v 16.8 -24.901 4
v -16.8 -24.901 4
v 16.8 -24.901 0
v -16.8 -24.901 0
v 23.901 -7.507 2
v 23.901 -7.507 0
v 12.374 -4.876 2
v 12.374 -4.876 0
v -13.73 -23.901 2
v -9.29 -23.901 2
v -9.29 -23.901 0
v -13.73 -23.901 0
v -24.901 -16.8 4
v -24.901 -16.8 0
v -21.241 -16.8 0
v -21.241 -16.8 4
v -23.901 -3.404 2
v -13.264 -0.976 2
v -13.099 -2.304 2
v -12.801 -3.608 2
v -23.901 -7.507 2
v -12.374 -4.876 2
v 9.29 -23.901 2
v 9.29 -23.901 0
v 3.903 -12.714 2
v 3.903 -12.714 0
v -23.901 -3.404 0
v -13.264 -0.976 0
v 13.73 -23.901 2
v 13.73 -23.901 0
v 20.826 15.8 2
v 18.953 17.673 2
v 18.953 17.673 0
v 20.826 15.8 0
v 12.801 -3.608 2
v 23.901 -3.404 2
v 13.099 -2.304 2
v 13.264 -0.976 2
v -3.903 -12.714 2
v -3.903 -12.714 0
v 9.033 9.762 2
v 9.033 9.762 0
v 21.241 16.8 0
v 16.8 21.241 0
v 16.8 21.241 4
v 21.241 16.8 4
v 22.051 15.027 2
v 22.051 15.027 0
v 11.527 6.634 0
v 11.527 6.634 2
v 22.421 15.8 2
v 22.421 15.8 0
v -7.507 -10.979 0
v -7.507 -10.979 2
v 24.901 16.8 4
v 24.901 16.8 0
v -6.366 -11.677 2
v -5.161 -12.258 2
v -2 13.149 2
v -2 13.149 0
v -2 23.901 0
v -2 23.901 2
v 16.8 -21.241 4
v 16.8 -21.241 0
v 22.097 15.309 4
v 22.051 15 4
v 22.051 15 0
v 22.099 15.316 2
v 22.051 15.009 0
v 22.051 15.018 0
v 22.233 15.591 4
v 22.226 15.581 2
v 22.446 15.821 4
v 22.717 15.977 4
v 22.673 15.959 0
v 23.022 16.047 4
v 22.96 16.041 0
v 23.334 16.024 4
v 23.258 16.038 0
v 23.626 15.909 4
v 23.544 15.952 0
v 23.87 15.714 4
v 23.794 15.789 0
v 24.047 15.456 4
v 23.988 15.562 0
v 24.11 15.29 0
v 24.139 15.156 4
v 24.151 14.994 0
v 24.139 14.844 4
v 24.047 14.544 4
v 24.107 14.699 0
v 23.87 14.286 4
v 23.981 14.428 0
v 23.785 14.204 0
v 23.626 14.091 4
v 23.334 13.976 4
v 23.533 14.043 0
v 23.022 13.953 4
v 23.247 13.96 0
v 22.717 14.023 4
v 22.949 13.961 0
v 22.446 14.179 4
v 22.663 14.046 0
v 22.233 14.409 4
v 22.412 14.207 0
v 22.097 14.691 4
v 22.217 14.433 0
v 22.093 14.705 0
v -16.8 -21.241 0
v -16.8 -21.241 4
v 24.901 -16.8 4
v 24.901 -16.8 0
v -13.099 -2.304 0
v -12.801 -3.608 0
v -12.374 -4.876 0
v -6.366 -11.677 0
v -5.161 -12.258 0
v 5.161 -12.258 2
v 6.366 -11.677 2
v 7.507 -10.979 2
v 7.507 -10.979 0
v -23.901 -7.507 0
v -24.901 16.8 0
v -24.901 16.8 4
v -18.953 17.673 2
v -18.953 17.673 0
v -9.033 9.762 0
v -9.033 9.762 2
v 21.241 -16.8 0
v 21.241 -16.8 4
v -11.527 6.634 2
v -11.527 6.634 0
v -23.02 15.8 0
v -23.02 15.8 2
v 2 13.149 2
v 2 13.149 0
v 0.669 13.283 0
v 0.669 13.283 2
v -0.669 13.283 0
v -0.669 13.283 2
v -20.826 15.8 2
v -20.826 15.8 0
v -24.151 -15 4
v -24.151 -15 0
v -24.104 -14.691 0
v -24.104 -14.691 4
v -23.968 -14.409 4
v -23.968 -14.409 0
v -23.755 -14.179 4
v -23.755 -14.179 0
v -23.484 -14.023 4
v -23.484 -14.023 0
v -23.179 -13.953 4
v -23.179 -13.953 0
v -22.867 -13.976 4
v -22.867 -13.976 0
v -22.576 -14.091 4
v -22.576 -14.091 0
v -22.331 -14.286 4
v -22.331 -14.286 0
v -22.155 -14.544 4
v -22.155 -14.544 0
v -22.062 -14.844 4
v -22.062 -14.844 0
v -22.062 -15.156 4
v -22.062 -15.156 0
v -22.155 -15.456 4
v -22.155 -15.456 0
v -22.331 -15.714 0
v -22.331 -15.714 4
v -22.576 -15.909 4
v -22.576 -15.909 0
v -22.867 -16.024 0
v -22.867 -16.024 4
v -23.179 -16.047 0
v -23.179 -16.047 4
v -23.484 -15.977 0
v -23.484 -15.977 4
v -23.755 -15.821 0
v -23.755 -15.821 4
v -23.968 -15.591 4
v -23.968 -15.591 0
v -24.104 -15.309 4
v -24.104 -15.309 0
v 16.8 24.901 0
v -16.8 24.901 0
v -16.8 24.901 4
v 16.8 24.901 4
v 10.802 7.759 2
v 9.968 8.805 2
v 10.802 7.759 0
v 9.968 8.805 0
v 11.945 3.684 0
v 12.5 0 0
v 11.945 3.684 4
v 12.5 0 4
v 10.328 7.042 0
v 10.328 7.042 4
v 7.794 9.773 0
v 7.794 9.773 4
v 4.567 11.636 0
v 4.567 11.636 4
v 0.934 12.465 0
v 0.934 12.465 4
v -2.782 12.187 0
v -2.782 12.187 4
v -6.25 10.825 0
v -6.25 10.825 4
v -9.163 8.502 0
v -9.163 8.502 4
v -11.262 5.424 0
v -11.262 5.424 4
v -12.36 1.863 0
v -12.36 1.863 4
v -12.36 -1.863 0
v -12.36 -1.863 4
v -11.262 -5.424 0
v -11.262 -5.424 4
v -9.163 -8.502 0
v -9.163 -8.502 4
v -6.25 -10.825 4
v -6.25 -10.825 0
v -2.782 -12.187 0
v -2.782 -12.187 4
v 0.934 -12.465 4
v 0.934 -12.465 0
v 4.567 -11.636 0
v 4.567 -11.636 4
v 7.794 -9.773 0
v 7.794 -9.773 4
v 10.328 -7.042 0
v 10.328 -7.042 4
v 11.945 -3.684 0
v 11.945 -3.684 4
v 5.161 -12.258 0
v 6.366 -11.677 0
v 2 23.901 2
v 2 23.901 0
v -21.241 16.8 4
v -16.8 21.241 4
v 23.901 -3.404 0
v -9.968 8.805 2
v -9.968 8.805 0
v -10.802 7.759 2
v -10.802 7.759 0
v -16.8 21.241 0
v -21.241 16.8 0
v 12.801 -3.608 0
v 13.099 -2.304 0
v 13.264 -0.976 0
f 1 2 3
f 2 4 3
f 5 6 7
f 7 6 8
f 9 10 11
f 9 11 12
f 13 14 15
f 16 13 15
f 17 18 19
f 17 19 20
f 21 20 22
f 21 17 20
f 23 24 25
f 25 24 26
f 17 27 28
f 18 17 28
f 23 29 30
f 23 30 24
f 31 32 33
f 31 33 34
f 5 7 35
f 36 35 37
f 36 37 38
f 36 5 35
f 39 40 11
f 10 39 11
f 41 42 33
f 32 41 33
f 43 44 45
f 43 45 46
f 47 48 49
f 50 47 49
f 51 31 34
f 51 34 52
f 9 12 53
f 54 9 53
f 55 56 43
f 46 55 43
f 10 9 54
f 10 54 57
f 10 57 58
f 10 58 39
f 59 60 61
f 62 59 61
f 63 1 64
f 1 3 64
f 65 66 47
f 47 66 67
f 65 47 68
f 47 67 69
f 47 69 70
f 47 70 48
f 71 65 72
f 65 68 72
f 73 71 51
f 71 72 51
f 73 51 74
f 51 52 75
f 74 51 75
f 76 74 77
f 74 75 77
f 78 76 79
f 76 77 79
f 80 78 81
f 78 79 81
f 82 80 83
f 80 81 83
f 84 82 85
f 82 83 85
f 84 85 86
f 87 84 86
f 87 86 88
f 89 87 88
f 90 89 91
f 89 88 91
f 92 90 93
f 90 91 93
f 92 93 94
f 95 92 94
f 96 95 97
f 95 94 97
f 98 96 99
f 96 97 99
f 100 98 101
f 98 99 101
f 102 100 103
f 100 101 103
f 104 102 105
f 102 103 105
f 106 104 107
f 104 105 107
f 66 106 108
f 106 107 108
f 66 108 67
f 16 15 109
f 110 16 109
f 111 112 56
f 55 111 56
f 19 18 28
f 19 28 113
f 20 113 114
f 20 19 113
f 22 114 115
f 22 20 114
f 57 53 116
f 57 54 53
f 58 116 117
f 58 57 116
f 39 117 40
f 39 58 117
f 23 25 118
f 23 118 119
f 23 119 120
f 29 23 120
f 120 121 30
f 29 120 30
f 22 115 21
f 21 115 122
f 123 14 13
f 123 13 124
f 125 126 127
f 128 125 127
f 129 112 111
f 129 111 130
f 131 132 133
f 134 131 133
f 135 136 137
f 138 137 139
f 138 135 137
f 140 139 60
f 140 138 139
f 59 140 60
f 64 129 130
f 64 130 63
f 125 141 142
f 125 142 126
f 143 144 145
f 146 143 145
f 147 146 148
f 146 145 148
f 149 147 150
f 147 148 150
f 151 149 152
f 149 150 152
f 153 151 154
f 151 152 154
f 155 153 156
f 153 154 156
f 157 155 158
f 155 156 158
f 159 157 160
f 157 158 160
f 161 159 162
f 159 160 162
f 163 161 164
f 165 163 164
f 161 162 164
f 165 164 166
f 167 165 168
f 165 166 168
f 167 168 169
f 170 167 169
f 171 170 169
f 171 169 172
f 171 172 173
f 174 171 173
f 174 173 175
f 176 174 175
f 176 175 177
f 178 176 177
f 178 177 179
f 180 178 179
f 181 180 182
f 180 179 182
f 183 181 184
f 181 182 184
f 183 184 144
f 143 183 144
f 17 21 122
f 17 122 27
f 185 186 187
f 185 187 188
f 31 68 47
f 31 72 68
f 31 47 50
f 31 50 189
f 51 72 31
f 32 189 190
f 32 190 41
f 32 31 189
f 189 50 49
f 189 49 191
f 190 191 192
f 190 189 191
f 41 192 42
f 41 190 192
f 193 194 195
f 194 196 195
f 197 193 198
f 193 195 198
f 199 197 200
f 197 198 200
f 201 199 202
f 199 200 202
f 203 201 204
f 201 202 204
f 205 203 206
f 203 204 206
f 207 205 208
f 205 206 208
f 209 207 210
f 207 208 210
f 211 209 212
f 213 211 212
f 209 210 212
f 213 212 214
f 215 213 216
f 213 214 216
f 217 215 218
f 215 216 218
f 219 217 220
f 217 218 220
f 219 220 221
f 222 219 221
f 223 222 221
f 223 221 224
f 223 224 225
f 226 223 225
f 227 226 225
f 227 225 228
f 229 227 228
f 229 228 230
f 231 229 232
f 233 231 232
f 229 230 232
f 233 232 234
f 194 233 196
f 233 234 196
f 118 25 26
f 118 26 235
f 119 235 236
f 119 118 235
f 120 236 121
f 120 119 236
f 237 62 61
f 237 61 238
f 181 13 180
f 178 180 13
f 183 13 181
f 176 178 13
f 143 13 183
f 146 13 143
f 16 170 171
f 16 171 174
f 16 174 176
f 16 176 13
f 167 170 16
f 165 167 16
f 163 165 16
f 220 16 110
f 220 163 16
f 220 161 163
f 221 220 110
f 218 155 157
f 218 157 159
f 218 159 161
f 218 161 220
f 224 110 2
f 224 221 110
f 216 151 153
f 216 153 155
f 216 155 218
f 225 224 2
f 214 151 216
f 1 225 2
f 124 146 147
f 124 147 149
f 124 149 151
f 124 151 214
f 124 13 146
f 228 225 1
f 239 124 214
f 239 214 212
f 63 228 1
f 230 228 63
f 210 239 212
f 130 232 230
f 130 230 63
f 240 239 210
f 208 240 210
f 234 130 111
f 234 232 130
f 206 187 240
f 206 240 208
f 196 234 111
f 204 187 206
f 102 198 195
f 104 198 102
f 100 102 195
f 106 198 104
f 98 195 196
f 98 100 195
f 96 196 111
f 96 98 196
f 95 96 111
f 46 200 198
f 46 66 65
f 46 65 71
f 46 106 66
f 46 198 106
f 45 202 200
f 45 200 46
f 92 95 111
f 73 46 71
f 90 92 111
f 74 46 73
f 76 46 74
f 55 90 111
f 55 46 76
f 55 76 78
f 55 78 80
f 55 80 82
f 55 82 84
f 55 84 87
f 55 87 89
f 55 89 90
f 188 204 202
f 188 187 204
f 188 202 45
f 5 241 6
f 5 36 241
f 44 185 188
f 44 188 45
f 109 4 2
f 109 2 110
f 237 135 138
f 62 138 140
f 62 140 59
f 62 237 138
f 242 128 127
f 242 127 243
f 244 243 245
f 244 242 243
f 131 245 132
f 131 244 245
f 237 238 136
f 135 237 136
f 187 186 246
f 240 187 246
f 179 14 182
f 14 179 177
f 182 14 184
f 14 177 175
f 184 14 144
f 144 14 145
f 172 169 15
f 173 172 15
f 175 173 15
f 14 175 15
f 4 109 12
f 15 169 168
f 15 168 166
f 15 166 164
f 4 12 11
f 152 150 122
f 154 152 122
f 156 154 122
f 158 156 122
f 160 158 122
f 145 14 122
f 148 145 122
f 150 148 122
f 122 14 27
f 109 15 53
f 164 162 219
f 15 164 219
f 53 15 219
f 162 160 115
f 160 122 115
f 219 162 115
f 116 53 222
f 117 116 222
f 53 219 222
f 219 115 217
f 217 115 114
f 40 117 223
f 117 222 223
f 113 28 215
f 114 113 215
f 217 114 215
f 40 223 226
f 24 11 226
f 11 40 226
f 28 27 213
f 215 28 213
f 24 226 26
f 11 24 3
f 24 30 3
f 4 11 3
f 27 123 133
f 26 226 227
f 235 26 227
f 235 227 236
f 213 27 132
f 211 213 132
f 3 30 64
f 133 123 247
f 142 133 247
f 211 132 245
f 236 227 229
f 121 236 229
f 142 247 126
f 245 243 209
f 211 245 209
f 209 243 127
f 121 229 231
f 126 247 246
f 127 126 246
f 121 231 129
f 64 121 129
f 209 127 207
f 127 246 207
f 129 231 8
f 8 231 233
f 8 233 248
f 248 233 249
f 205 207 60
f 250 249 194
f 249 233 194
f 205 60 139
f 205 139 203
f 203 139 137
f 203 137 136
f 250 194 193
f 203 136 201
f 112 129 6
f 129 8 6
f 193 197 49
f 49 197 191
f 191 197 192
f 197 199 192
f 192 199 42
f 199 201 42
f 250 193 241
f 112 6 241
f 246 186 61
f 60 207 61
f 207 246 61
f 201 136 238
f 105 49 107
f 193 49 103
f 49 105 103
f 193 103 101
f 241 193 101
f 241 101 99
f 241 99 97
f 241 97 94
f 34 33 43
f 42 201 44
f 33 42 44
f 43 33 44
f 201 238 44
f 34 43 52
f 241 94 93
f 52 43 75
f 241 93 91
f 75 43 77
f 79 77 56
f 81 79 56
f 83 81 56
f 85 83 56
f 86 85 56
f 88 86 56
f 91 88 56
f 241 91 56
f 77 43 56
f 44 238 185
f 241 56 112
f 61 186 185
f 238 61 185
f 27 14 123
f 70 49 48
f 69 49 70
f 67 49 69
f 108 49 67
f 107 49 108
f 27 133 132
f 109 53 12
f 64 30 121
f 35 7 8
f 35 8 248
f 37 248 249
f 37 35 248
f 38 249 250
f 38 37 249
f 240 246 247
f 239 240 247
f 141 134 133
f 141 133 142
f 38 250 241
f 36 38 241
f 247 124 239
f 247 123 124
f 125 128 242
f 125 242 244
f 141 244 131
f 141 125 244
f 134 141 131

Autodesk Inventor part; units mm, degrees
ref_plane "YZ Plane" through (0, 0, 0) normal (1, 0, 0) x (0, 1, 0)
ref_plane "XZ Plane" through (0, 0, 0) normal (0, 1, 0) x (-1, 0, 0)
ref_plane "XY Plane" through (0, 0, 0) normal (0, 0, 1) x (1, 0, 0)
sketch "Sketch1" plane through (0, 0, 0) normal (0, 0, 1) x (1, 0, 0)
  line L0 (-34.8609, 0) -> (34.8609, 0) construction
  line L1 (0, -34.8609) -> (0, 34.8609) construction
  line L2 (0, 0) -> (11.6542, 11.6542) construction
  line L3 (0, 0) -> (16.4815, 0) construction
  line L4 (0, 24.9006) -> (16.8, 24.9006)
  line L5 (16.8, 24.9006) -> (16.8, 21.2406)
  line L6 (16.8, 21.2406) -> (19.0203, 19.0203)
  line L7 (24.9006, 0) -> (24.9006, 16.8)
  line L8 (24.9006, 16.8) -> (21.2406, 16.8)
  line L9 (21.2406, 16.8) -> (19.0203, 19.0203)
  line L10 (0, 0) -> (-11.6542, 11.6542) construction
  line L11 (0, 0) -> (-16.4815, 0) construction
  line L12 (0, 24.9006) -> (-16.8, 24.9006)
  line L13 (-16.8, 24.9006) -> (-16.8, 21.2406)
  line L14 (-16.8, 21.2406) -> (-19.0203, 19.0203)
  line L15 (-24.9006, 0) -> (-24.9006, 16.8)
  line L16 (-24.9006, 16.8) -> (-21.2406, 16.8)
  line L17 (-21.2406, 16.8) -> (-19.0203, 19.0203)
  line L18 (0, 0) -> (11.6542, -11.6542) construction
  line L19 (0, -24.9006) -> (16.8, -24.9006)
  line L20 (16.8, -24.9006) -> (16.8, -21.2406)
  line L21 (16.8, -21.2406) -> (19.0203, -19.0203)
  line L22 (24.9006, 0) -> (24.9006, -16.8)
  line L23 (24.9006, -16.8) -> (21.2406, -16.8)
  line L24 (21.2406, -16.8) -> (19.0203, -19.0203)
  line L25 (0, 0) -> (-11.6542, -11.6542) construction
  line L26 (0, -24.9006) -> (-16.8, -24.9006)
  line L27 (-16.8, -24.9006) -> (-16.8, -21.2406)
  line L28 (-16.8, -21.2406) -> (-19.0203, -19.0203)
  line L29 (-24.9006, 0) -> (-24.9006, -16.8)
  line L30 (-24.9006, -16.8) -> (-21.2406, -16.8)
  line L31 (-21.2406, -16.8) -> (-19.0203, -19.0203)
  dimension "d0" = 45
  dimension "d1" = 3.14
  dimension "d2" = 3.66
  dimension "d3" = 16.8
extrude "Extrusion1" add sketch "Sketch1" along normal blind 4
hole "Hole1" at (0, 0, 0) direction (0, 0, 1) diameter 26.6 end through all
sketch "Sketch6" plane through (0, 0, 4) normal (0, 0, 1) x (1, 0, 0)
  circle A0 centre (0, 0) radius 13.3 construction
  line L0 (16.8, 24.9006) -> (-16.8, 24.9006) construction
  line L1 (-16.8, 24.9006) -> (-16.8, 21.2406) construction
  line L2 (-16.8, 21.2406) -> (-21.2406, 16.8) construction
  line L3 (-21.2406, 16.8) -> (-24.9006, 16.8) construction
  line L4 (-24.9006, 16.8) -> (-24.9006, -16.8) construction
  line L5 (-24.9006, -16.8) -> (-21.2406, -16.8) construction
  line L6 (-21.2406, -16.8) -> (-16.8, -21.2406) construction
  line L7 (-16.8, -21.2406) -> (-16.8, -24.9006) construction
  line L8 (-16.8, -24.9006) -> (16.8, -24.9006) construction
  line L9 (16.8, -24.9006) -> (16.8, -21.2406) construction
  line L10 (16.8, -21.2406) -> (21.2406, -16.8) construction
  line L11 (21.2406, -16.8) -> (24.9006, -16.8) construction
  line L12 (24.9006, -16.8) -> (24.9006, 16.8) construction
  line L13 (24.9006, 16.8) -> (21.2406, 16.8) construction
  line L14 (21.2406, 16.8) -> (16.8, 21.2406) construction
  line L15 (16.8, 21.2406) -> (16.8, 24.9006) construction
  circle A1 centre (0, 0) radius 13.3
  circle A2 centre (0, 0) radius 13.5
  dimension "d42" = 26.6
  dimension "d43" = 27
extrude "Extrusion4" [suppressed]
sketch "Sketch7" plane through (0, 0, 0) normal (0, 0, -1) x (-1, 0, 0)
  line L0 (16.8, 24.9006) -> (-16.8, 24.9006) construction
  line L1 (-16.8, 24.9006) -> (-16.8, 21.2406) construction
  line L2 (-16.8, 21.2406) -> (-21.2406, 16.8) construction
  line L3 (-21.2406, 16.8) -> (-24.9006, 16.8) construction
  line L4 (-24.9006, 16.8) -> (-24.9006, -16.8) construction
  line L5 (-24.9006, -16.8) -> (-21.2406, -16.8) construction
  line L6 (-21.2406, -16.8) -> (-16.8, -21.2406) construction
  line L7 (-16.8, -21.2406) -> (-16.8, -24.9006) construction
  line L8 (-16.8, -24.9006) -> (16.8, -24.9006) construction
  line L9 (16.8, -24.9006) -> (16.8, -21.2406) construction
  line L10 (16.8, -21.2406) -> (21.2406, -16.8) construction
  line L11 (21.2406, -16.8) -> (24.9006, -16.8) construction
  line L12 (24.9006, -16.8) -> (24.9006, 16.8) construction
  line L13 (24.9006, 16.8) -> (21.2406, 16.8) construction
  line L14 (21.2406, 16.8) -> (16.8, 21.2406) construction
  line L15 (16.8, 21.2406) -> (16.8, 24.9006) construction
  line L16 (-2.0147, 24.1761) -> (-2, 24) construction
  line L17 (-1.9775, 24.0019) -> (-1.9921, 24.178) construction
  line L18 (1.9921, 24.178) -> (1.9775, 24.0019) construction
  line L19 (2, 24) -> (2.0147, 24.1761) construction
  line L20 (5.9445, 23.5204) -> (5.9012, 23.349) construction
  line L21 (5.923, 23.3435) -> (5.9665, 23.5148) construction
  line L22 (9.7347, 22.2212) -> (9.6638, 22.0593) construction
  line L23 (9.6844, 22.0502) -> (9.7555, 22.212) construction
  line L24 (13.2594, 20.3158) -> (13.1628, 20.1678) construction
  line L25 (13.1817, 20.1555) -> (13.2784, 20.3034) construction
  line L26 (16.4225, 17.8563) -> (16.3028, 17.7262) construction
  line L27 (16.3194, 17.7109) -> (16.4392, 17.8409) construction
  line L28 (19.1375, 14.9097) -> (18.9981, 14.8011) construction
  line L29 (19.0119, 14.7833) -> (19.1515, 14.8918) construction
  line L30 (21.3306, 11.5564) -> (21.1752, 11.4722) construction
  line L31 (21.1859, 11.4524) -> (21.3414, 11.5365) construction
  line L32 (22.9418, 7.8879) -> (22.7746, 7.8305) construction
  line L33 (22.782, 7.8091) -> (22.9492, 7.8665) construction
  line L34 (23.9272, 4.0042) -> (23.7529, 3.9751) construction
  line L35 (23.7566, 3.9529) -> (23.9309, 3.9819) construction
  line L36 (24.2599, 0.0113) -> (24.0832, 0.0113) construction
  line L37 (24.0832, -0.0113) -> (24.2599, -0.0113) construction
  line L38 (23.9309, -3.9819) -> (23.7566, -3.9529) construction
  line L39 (23.7529, -3.9751) -> (23.9272, -4.0042) construction
  line L40 (22.9492, -7.8665) -> (22.782, -7.8091) construction
  line L41 (22.7746, -7.8305) -> (22.9418, -7.8879) construction
  line L42 (21.3414, -11.5365) -> (21.1859, -11.4524) construction
  line L43 (21.1752, -11.4722) -> (21.3306, -11.5564) construction
  line L44 (19.1515, -14.8918) -> (19.0119, -14.7833) construction
  line L45 (18.9981, -14.8011) -> (19.1375, -14.9097) construction
  line L46 (16.4392, -17.8409) -> (16.3194, -17.7109) construction
  line L47 (16.3028, -17.7262) -> (16.4225, -17.8563) construction
  line L48 (13.2784, -20.3034) -> (13.1817, -20.1555) construction
  line L49 (13.1628, -20.1678) -> (13.2594, -20.3158) construction
  line L50 (9.7555, -22.212) -> (9.6844, -22.0502) construction
  line L51 (9.6638, -22.0593) -> (9.7347, -22.2212) construction
  line L52 (5.9665, -23.5148) -> (5.923, -23.3435) construction
  line L53 (5.9012, -23.349) -> (5.9445, -23.5204) construction
  line L54 (2.0147, -24.1761) -> (2, -24) construction
  line L55 (1.9775, -24.0019) -> (1.9921, -24.178) construction
  line L56 (-1.9921, -24.178) -> (-1.9775, -24.0019) construction
  line L57 (-2, -24) -> (-2.0147, -24.1761) construction
  line L58 (-5.9445, -23.5204) -> (-5.9012, -23.349) construction
  line L59 (-5.923, -23.3435) -> (-5.9665, -23.5148) construction
  line L60 (-9.7347, -22.2212) -> (-9.6638, -22.0593) construction
  line L61 (-9.6844, -22.0502) -> (-9.7555, -22.212) construction
  line L62 (-13.2594, -20.3158) -> (-13.1628, -20.1678) construction
  line L63 (-13.1817, -20.1555) -> (-13.2784, -20.3034) construction
  line L64 (-16.4225, -17.8563) -> (-16.3028, -17.7262) construction
  line L65 (-16.3194, -17.7109) -> (-16.4392, -17.8409) construction
  line L66 (-19.1375, -14.9097) -> (-18.9981, -14.8011) construction
  line L67 (-19.0119, -14.7833) -> (-19.1515, -14.8918) construction
  line L68 (-21.3306, -11.5564) -> (-21.1752, -11.4722) construction
  line L69 (-21.1859, -11.4524) -> (-21.3414, -11.5365) construction
  line L70 (-22.9418, -7.8879) -> (-22.7746, -7.8305) construction
  line L71 (-22.782, -7.8091) -> (-22.9492, -7.8665) construction
  line L72 (-23.9272, -4.0042) -> (-23.7529, -3.9751) construction
  line L73 (-23.7566, -3.9529) -> (-23.9309, -3.9819) construction
  line L74 (-24.2599, -0.0113) -> (-24.0832, -0.0113) construction
  line L75 (-24.0832, 0.0113) -> (-24.2599, 0.0113) construction
  line L76 (-23.9309, 3.9819) -> (-23.7566, 3.9529) construction
  line L77 (-23.7529, 3.9751) -> (-23.9272, 4.0042) construction
  line L78 (-22.9492, 7.8665) -> (-22.782, 7.8091) construction
  line L79 (-22.7746, 7.8305) -> (-22.9418, 7.8879) construction
  line L80 (-21.3414, 11.5365) -> (-21.1859, 11.4524) construction
  line L81 (-21.1752, 11.4722) -> (-21.3306, 11.5564) construction
  line L82 (-19.1515, 14.8918) -> (-19.0119, 14.7833) construction
  line L83 (-18.9981, 14.8011) -> (-19.1375, 14.9097) construction
  line L84 (-16.4392, 17.8409) -> (-16.3194, 17.7109) construction
  line L85 (-16.3028, 17.7262) -> (-16.4225, 17.8563) construction
  line L86 (-13.2784, 20.3034) -> (-13.1817, 20.1555) construction
  line L87 (-13.1628, 20.1678) -> (-13.2594, 20.3158) construction
  line L88 (-9.7555, 22.212) -> (-9.6844, 22.0502) construction
  line L89 (-9.6638, 22.0593) -> (-9.7347, 22.2212) construction
  line L90 (-5.9665, 23.5148) -> (-5.923, 23.3435) construction
  line L91 (-5.9012, 23.349) -> (-5.9445, 23.5204) construction
  circle A0 centre (0, 24.5946) radius 2 construction
  line L92 (2, 33.2113) -> (-2, 33.2113)
  line L93 (-2, 33.2113) -> (-2, 6.8481)
  line L94 (-2, 6.8481) -> (2, 6.8481)
  line L95 (2, 6.8481) -> (2, 33.2113)
  circle A1 centre (-17.7867, 14.1844) radius 1.25 projected
  circle A2 centre (-22.1796, -5.0624) radius 1.25 projected
  circle A3 centre (-9.8709, -20.497) radius 1.25 projected
  circle A4 centre (9.8709, -20.497) radius 1.25 projected
  circle A5 centre (22.1796, -5.0624) radius 1.25 projected
  circle A6 centre (17.7867, 14.1844) radius 1.25 projected
  circle A7 centre (0, 22.75) radius 1.25 projected
  arc A8 (-2.0147, 24.1761) -> (-5.9445, 23.5204) centre (-3.9503, 23.6727) ccw projected
  arc A9 (-1.9973, 24.1039) -> (-2, 24) centre (0, 24) ccw projected
  arc A10 (-1.9775, 24.0019) -> (-1.9973, 24.1039) centre (-3.9503, 23.6727) ccw projected
  arc A11 (1.9921, 24.178) -> (-1.9921, 24.178) centre (0, 24) ccw projected
  arc A12 (1.9973, 24.1039) -> (1.9775, 24.0019) centre (3.9503, 23.6727) ccw projected
  arc A13 (2, 24) -> (1.9973, 24.1039) centre (0, 24) ccw projected
  arc A14 (5.9445, 23.5204) -> (2.0147, 24.1761) centre (3.9503, 23.6727) ccw projected
  arc A15 (5.9374, 23.4464) -> (5.9012, 23.349) centre (7.7928, 22.6996) ccw projected
  arc A16 (5.923, 23.3435) -> (5.9374, 23.4464) centre (3.9503, 23.6727) ccw projected
  arc A17 (9.7347, 22.2212) -> (5.9665, 23.5148) centre (7.7928, 22.6996) ccw projected
  arc A18 (9.7156, 22.1493) -> (9.6638, 22.0593) centre (11.4227, 21.1074) ccw projected
  arc A19 (9.6844, 22.0502) -> (9.7156, 22.1493) centre (7.7928, 22.6996) ccw projected
  arc A20 (13.2594, 20.3158) -> (9.7555, 22.212) centre (11.4227, 21.1074) ccw projected
  arc A21 (13.2287, 20.2481) -> (13.1628, 20.1678) centre (14.7411, 18.9394) ccw projected
  arc A22 (13.1817, 20.1555) -> (13.2287, 20.2481) centre (11.4227, 21.1074) ccw projected
  arc A23 (16.4225, 17.8563) -> (13.2784, 20.3034) centre (14.7411, 18.9394) ccw projected
  arc A24 (16.381, 17.7946) -> (16.3028, 17.7262) centre (17.6574, 16.2548) ccw projected
  arc A25 (16.3194, 17.7109) -> (16.381, 17.7946) centre (14.7411, 18.9394) ccw projected
  arc A26 (19.1375, 14.9097) -> (16.4392, 17.8409) centre (17.6574, 16.2548) ccw projected
  arc A27 (19.0865, 14.8556) -> (18.9981, 14.8011) centre (20.092, 13.1268) ccw projected
  arc A28 (19.0119, 14.7833) -> (19.0865, 14.8556) centre (17.6574, 16.2548) ccw projected
  arc A29 (21.3306, 11.5564) -> (19.1515, 14.8918) centre (20.092, 13.1268) ccw projected
  arc A30 (21.2714, 11.5115) -> (21.1752, 11.4722) centre (21.9786, 9.6407) ccw projected
  arc A31 (21.1859, 11.4524) -> (21.2714, 11.5115) centre (20.092, 13.1268) ccw projected
  arc A32 (22.9418, 7.8879) -> (21.3414, 11.5365) centre (21.9786, 9.6407) ccw projected
  arc A33 (22.876, 7.8533) -> (22.7746, 7.8305) centre (23.2656, 5.8917) ccw projected
  arc A34 (22.782, 7.8091) -> (22.876, 7.8533) centre (21.9786, 9.6407) ccw projected
  arc A35 (23.9272, 4.0042) -> (22.9492, 7.8665) centre (23.2656, 5.8917) ccw projected
  arc A36 (23.8566, 3.981) -> (23.7529, 3.9751) centre (23.918, 1.9819) ccw projected
  arc A37 (23.7566, 3.9529) -> (23.8566, 3.981) centre (23.2656, 5.8917) ccw projected
  arc A38 (24.2599, 0.0113) -> (23.9309, 3.9819) centre (23.918, 1.9819) ccw projected
  arc A39 (24.1865, 0) -> (24.0832, 0.0113) centre (23.918, -1.9819) ccw projected
  arc A40 (24.0832, -0.0113) -> (24.1865, 0) centre (23.918, 1.9819) ccw projected
  arc A41 (23.9309, -3.9819) -> (24.2599, -0.0113) centre (23.918, -1.9819) ccw projected
  arc A42 (23.8566, -3.981) -> (23.7566, -3.9529) centre (23.2656, -5.8917) ccw projected
  arc A43 (23.7529, -3.9751) -> (23.8566, -3.981) centre (23.918, -1.9819) ccw projected
  arc A44 (22.9492, -7.8665) -> (23.9272, -4.0042) centre (23.2656, -5.8917) ccw projected
  arc A45 (22.876, -7.8533) -> (22.782, -7.8091) centre (21.9786, -9.6407) ccw projected
  arc A46 (22.7746, -7.8305) -> (22.876, -7.8533) centre (23.2656, -5.8917) ccw projected
  arc A47 (21.3414, -11.5365) -> (22.9418, -7.8879) centre (21.9786, -9.6407) ccw projected
  arc A48 (21.2714, -11.5115) -> (21.1859, -11.4524) centre (20.092, -13.1268) ccw projected
  arc A49 (21.1752, -11.4722) -> (21.2714, -11.5115) centre (21.9786, -9.6407) ccw projected
  arc A50 (19.1515, -14.8918) -> (21.3306, -11.5564) centre (20.092, -13.1268) ccw projected
  arc A51 (19.0865, -14.8556) -> (19.0119, -14.7833) centre (17.6574, -16.2548) ccw projected
  arc A52 (18.9981, -14.8011) -> (19.0865, -14.8556) centre (20.092, -13.1268) ccw projected
  arc A53 (16.4392, -17.8409) -> (19.1375, -14.9097) centre (17.6574, -16.2548) ccw projected
  arc A54 (16.381, -17.7946) -> (16.3194, -17.7109) centre (14.7411, -18.9394) ccw projected
  arc A55 (16.3028, -17.7262) -> (16.381, -17.7946) centre (17.6574, -16.2548) ccw projected
  arc A56 (13.2784, -20.3034) -> (16.4225, -17.8563) centre (14.7411, -18.9394) ccw projected
  arc A57 (13.2287, -20.2481) -> (13.1817, -20.1555) centre (11.4227, -21.1074) ccw projected
  arc A58 (13.1628, -20.1678) -> (13.2287, -20.2481) centre (14.7411, -18.9394) ccw projected
  arc A59 (9.7555, -22.212) -> (13.2594, -20.3158) centre (11.4227, -21.1074) ccw projected
  arc A60 (9.7156, -22.1493) -> (9.6844, -22.0502) centre (7.7928, -22.6996) ccw projected
  arc A61 (9.6638, -22.0593) -> (9.7156, -22.1493) centre (11.4227, -21.1074) ccw projected
  arc A62 (5.9665, -23.5148) -> (9.7347, -22.2212) centre (7.7928, -22.6996) ccw projected
  arc A63 (5.9374, -23.4464) -> (5.923, -23.3435) centre (3.9503, -23.6727) ccw projected
  arc A64 (5.9012, -23.349) -> (5.9374, -23.4464) centre (7.7928, -22.6996) ccw projected
  arc A65 (2.0147, -24.1761) -> (5.9445, -23.5204) centre (3.9503, -23.6727) ccw projected
  arc A66 (1.9973, -24.1039) -> (2, -24) centre (0, -24) ccw projected
  arc A67 (1.9775, -24.0019) -> (1.9973, -24.1039) centre (3.9503, -23.6727) ccw projected
  arc A68 (-1.9921, -24.178) -> (1.9921, -24.178) centre (0, -24) ccw projected
  arc A69 (-1.9973, -24.1039) -> (-1.9775, -24.0019) centre (-3.9503, -23.6727) ccw projected
  arc A70 (-2, -24) -> (-1.9973, -24.1039) centre (0, -24) ccw projected
  arc A71 (-5.9445, -23.5204) -> (-2.0147, -24.1761) centre (-3.9503, -23.6727) ccw projected
  arc A72 (-5.9374, -23.4464) -> (-5.9012, -23.349) centre (-7.7928, -22.6996) ccw projected
  arc A73 (-5.923, -23.3435) -> (-5.9374, -23.4464) centre (-3.9503, -23.6727) ccw projected
  arc A74 (-9.7347, -22.2212) -> (-5.9665, -23.5148) centre (-7.7928, -22.6996) ccw projected
  arc A75 (-9.7156, -22.1493) -> (-9.6638, -22.0593) centre (-11.4227, -21.1074) ccw projected
  arc A76 (-9.6844, -22.0502) -> (-9.7156, -22.1493) centre (-7.7928, -22.6996) ccw projected
  arc A77 (-13.2594, -20.3158) -> (-9.7555, -22.212) centre (-11.4227, -21.1074) ccw projected
  arc A78 (-13.2287, -20.2481) -> (-13.1628, -20.1678) centre (-14.7411, -18.9394) ccw projected
  arc A79 (-13.1817, -20.1555) -> (-13.2287, -20.2481) centre (-11.4227, -21.1074) ccw projected
  arc A80 (-16.4225, -17.8563) -> (-13.2784, -20.3034) centre (-14.7411, -18.9394) ccw projected
  arc A81 (-16.381, -17.7946) -> (-16.3028, -17.7262) centre (-17.6574, -16.2548) ccw projected
  arc A82 (-16.3194, -17.7109) -> (-16.381, -17.7946) centre (-14.7411, -18.9394) ccw projected
  arc A83 (-19.1375, -14.9097) -> (-16.4392, -17.8409) centre (-17.6574, -16.2548) ccw projected
  arc A84 (-19.0865, -14.8556) -> (-18.9981, -14.8011) centre (-20.092, -13.1268) ccw projected
  arc A85 (-19.0119, -14.7833) -> (-19.0865, -14.8556) centre (-17.6574, -16.2548) ccw projected
  arc A86 (-21.3306, -11.5564) -> (-19.1515, -14.8918) centre (-20.092, -13.1268) ccw projected
  arc A87 (-21.2714, -11.5115) -> (-21.1752, -11.4722) centre (-21.9786, -9.6407) ccw projected
  arc A88 (-21.1859, -11.4524) -> (-21.2714, -11.5115) centre (-20.092, -13.1268) ccw projected
  arc A89 (-22.9418, -7.8879) -> (-21.3414, -11.5365) centre (-21.9786, -9.6407) ccw projected
  arc A90 (-22.876, -7.8533) -> (-22.7746, -7.8305) centre (-23.2656, -5.8917) ccw projected
  arc A91 (-22.782, -7.8091) -> (-22.876, -7.8533) centre (-21.9786, -9.6407) ccw projected
  arc A92 (-23.9272, -4.0042) -> (-22.9492, -7.8665) centre (-23.2656, -5.8917) ccw projected
  arc A93 (-23.8566, -3.981) -> (-23.7529, -3.9751) centre (-23.918, -1.9819) ccw projected
  arc A94 (-23.7566, -3.9529) -> (-23.8566, -3.981) centre (-23.2656, -5.8917) ccw projected
  arc A95 (-24.2599, -0.0113) -> (-23.9309, -3.9819) centre (-23.918, -1.9819) ccw projected
  arc A96 (-24.1865, 0) -> (-24.0832, -0.0113) centre (-23.918, 1.9819) ccw projected
  arc A97 (-24.0832, 0.0113) -> (-24.1865, 0) centre (-23.918, -1.9819) ccw projected
  arc A98 (-23.9309, 3.9819) -> (-24.2599, 0.0113) centre (-23.918, 1.9819) ccw projected
  arc A99 (-23.8566, 3.981) -> (-23.7566, 3.9529) centre (-23.2656, 5.8917) ccw projected
  arc A100 (-23.7529, 3.9751) -> (-23.8566, 3.981) centre (-23.918, 1.9819) ccw projected
  arc A101 (-22.9492, 7.8665) -> (-23.9272, 4.0042) centre (-23.2656, 5.8917) ccw projected
  arc A102 (-22.876, 7.8533) -> (-22.782, 7.8091) centre (-21.9786, 9.6407) ccw projected
  arc A103 (-22.7746, 7.8305) -> (-22.876, 7.8533) centre (-23.2656, 5.8917) ccw projected
  arc A104 (-21.3414, 11.5365) -> (-22.9418, 7.8879) centre (-21.9786, 9.6407) ccw projected
  arc A105 (-21.2714, 11.5115) -> (-21.1859, 11.4524) centre (-20.092, 13.1268) ccw projected
  arc A106 (-21.1752, 11.4722) -> (-21.2714, 11.5115) centre (-21.9786, 9.6407) ccw projected
  arc A107 (-19.1515, 14.8918) -> (-21.3306, 11.5564) centre (-20.092, 13.1268) ccw projected
  arc A108 (-19.0865, 14.8556) -> (-19.0119, 14.7833) centre (-17.6574, 16.2548) ccw projected
  arc A109 (-18.9981, 14.8011) -> (-19.0865, 14.8556) centre (-20.092, 13.1268) ccw projected
  arc A110 (-16.4392, 17.8409) -> (-19.1375, 14.9097) centre (-17.6574, 16.2548) ccw projected
  arc A111 (-16.381, 17.7946) -> (-16.3194, 17.7109) centre (-14.7411, 18.9394) ccw projected
  arc A112 (-16.3028, 17.7262) -> (-16.381, 17.7946) centre (-17.6574, 16.2548) ccw projected
  arc A113 (-13.2784, 20.3034) -> (-16.4225, 17.8563) centre (-14.7411, 18.9394) ccw projected
  arc A114 (-13.2287, 20.2481) -> (-13.1817, 20.1555) centre (-11.4227, 21.1074) ccw projected
  arc A115 (-13.1628, 20.1678) -> (-13.2287, 20.2481) centre (-14.7411, 18.9394) ccw projected
  arc A116 (-9.7555, 22.212) -> (-13.2594, 20.3158) centre (-11.4227, 21.1074) ccw projected
  arc A117 (-9.7156, 22.1493) -> (-9.6844, 22.0502) centre (-7.7928, 22.6996) ccw projected
  arc A118 (-9.6638, 22.0593) -> (-9.7156, 22.1493) centre (-11.4227, 21.1074) ccw projected
  arc A119 (-5.9665, 23.5148) -> (-9.7347, 22.2212) centre (-7.7928, 22.6996) ccw projected
  arc A120 (-5.9374, 23.4464) -> (-5.923, 23.3435) centre (-3.9503, 23.6727) ccw projected
  arc A121 (-5.9012, 23.349) -> (-5.9374, 23.4464) centre (-7.7928, 22.6996) ccw projected
  circle A122 centre (0, 0) radius 21 projected
  point P0 (0, 0)
  point P1 (3.35, 15.4344)
  point P2 (3.35, -6.3124)
  point P3 (3.35, 24.1039)
  point P4 (3.35, 24.1039)
  point P5 (3.35, 25.6727)
  point P6 (3.35, 23.4464)
  point P7 (3.35, 20.3158)
  point P8 (3.35, 20.2481)
  point P9 (3.35, 17.7946)
  point P10 (3.35, 14.8556)
  point P11 (3.35, 11.5115)
  point P12 (3.35, 7.8533)
  point P13 (3.35, 3.981)
  point P14 (3.35, 0.0113)
  point P15 (3.35, 0)
  point P16 (3.35, -3.981)
  point P17 (3.35, -7.8533)
  point P18 (3.35, -11.5115)
  point P19 (3.35, -14.8556)
  point P20 (3.35, -18.2548)
  point P21 (3.35, -17.7946)
  point P22 (3.35, -20.2481)
  point P23 (3.35, -22.1493)
  point P24 (3.35, -23.4464)
  point P25 (3.35, -24.1039)
  point P26 (3.35, -24.1039)
  point P27 (3.35, -25.6727)
  point P28 (3.35, -23.4464)
  point P29 (3.35, -20.3158)
  point P30 (3.35, -20.1555)
  point P31 (3.35, -17.7109)
  point P32 (3.35, -14.7833)
  point P33 (3.35, -11.4524)
  point P34 (3.35, -7.8091)
  point P35 (3.35, -3.9529)
  point P36 (3.35, -0.0113)
  point P37 (3.35, 0.0113)
  point P38 (3.35, 3.981)
  point P39 (3.35, 7.8533)
  point P40 (3.35, 11.5115)
  point P41 (3.35, 14.8556)
  point P42 (3.35, 18.2548)
  point P43 (3.35, 17.7946)
  point P44 (3.35, 20.2481)
  point P45 (3.35, 22.1493)
  point P46 (3.35, 23.4464)
  dimension "d32" = 4
extrude "Extrusion5" cut sketch "Sketch7" against normal blind 2 contours L95 A122 L93 L92 | L95 L94 L93 A122 | A7 picked at (0.2225, 11.5619)
pattern_circular "Circular Pattern1" count 7 over 360 about axis through (0, 0, -10) along (0, 0, 1) of "Extrusion5"
sketch "Sketch8" plane through (0, 0, 4) normal (0, 0, 1) x (1, 0, 0)
  line L0 (16.8, 24.9006) -> (-16.8, 24.9006) projected
  line L1 (-16.8, 24.9006) -> (-16.8, 21.2406) projected
  line L2 (-16.8, 21.2406) -> (-21.2406, 16.8) projected
  line L3 (-21.2406, 16.8) -> (-24.9006, 16.8) projected
  line L4 (-24.9006, 16.8) -> (-24.9006, -16.8) projected
  line L5 (-24.9006, -16.8) -> (-21.2406, -16.8) projected
  line L6 (-21.2406, -16.8) -> (-16.8, -21.2406) projected
  line L7 (-16.8, -21.2406) -> (-16.8, -24.9006) projected
  line L8 (-16.8, -24.9006) -> (16.8, -24.9006) projected
  line L9 (16.8, -24.9006) -> (16.8, -21.2406) projected
  line L10 (16.8, -21.2406) -> (21.2406, -16.8) projected
  line L11 (21.2406, -16.8) -> (24.9006, -16.8) projected
  line L12 (24.9006, -16.8) -> (24.9006, 16.8) projected
  line L13 (24.9006, 16.8) -> (21.2406, 16.8) projected
  line L14 (21.2406, 16.8) -> (16.8, 21.2406) projected
  line L15 (16.8, 21.2406) -> (16.8, 24.9006) projected
  line L16 (-23.9006, -15.8) -> (-23.9006, 15.8)
  line L17 (-23.9006, 15.8) -> (-20.8264, 15.8)
  line L18 (-20.8264, 15.8) -> (-15.8, 20.8264)
  line L19 (-15.8, 20.8264) -> (-15.8, 23.9006)
  line L20 (-15.8, 23.9006) -> (15.8, 23.9006)
  line L21 (15.8, 23.9006) -> (15.8, 20.8264)
  line L22 (15.8, 20.8264) -> (20.8264, 15.8)
  line L23 (20.8264, 15.8) -> (23.9006, 15.8)
  line L24 (23.9006, 15.8) -> (23.9006, -15.8)
  line L25 (23.9006, -15.8) -> (20.8264, -15.8)
  line L26 (20.8264, -15.8) -> (15.8, -20.8264)
  line L27 (15.8, -20.8264) -> (15.8, -23.9006)
  line L28 (15.8, -23.9006) -> (-15.8, -23.9006)
  line L29 (-15.8, -23.9006) -> (-15.8, -20.8264)
  line L30 (-15.8, -20.8264) -> (-20.8264, -15.8)
  line L31 (-20.8264, -15.8) -> (-23.9006, -15.8)
  circle A0 centre (0, 0) radius 13.3 projected
  circle A1 centre (0, 0) radius 12.5
  dimension "d41" = 1
  dimension "d46" = 0.8
extrude "Extrusion6" add sketch "Sketch8" against normal up to surface (4 mm away)
sketch "Sketch9" plane through (0, 0, 0) normal (0, 0, -1) x (-1, 0, 0)
  circle A0 centre (-23.1006, 15) radius 1.05 projected
  circle A1 centre (23.1006, -15) radius 1.05 projected
  point P0 (0, 0)
extrude "Extrusion7" cut sketch "Sketch9" against normal through all
properties part number "20_Cube_Insert_CirAp_Guide"
